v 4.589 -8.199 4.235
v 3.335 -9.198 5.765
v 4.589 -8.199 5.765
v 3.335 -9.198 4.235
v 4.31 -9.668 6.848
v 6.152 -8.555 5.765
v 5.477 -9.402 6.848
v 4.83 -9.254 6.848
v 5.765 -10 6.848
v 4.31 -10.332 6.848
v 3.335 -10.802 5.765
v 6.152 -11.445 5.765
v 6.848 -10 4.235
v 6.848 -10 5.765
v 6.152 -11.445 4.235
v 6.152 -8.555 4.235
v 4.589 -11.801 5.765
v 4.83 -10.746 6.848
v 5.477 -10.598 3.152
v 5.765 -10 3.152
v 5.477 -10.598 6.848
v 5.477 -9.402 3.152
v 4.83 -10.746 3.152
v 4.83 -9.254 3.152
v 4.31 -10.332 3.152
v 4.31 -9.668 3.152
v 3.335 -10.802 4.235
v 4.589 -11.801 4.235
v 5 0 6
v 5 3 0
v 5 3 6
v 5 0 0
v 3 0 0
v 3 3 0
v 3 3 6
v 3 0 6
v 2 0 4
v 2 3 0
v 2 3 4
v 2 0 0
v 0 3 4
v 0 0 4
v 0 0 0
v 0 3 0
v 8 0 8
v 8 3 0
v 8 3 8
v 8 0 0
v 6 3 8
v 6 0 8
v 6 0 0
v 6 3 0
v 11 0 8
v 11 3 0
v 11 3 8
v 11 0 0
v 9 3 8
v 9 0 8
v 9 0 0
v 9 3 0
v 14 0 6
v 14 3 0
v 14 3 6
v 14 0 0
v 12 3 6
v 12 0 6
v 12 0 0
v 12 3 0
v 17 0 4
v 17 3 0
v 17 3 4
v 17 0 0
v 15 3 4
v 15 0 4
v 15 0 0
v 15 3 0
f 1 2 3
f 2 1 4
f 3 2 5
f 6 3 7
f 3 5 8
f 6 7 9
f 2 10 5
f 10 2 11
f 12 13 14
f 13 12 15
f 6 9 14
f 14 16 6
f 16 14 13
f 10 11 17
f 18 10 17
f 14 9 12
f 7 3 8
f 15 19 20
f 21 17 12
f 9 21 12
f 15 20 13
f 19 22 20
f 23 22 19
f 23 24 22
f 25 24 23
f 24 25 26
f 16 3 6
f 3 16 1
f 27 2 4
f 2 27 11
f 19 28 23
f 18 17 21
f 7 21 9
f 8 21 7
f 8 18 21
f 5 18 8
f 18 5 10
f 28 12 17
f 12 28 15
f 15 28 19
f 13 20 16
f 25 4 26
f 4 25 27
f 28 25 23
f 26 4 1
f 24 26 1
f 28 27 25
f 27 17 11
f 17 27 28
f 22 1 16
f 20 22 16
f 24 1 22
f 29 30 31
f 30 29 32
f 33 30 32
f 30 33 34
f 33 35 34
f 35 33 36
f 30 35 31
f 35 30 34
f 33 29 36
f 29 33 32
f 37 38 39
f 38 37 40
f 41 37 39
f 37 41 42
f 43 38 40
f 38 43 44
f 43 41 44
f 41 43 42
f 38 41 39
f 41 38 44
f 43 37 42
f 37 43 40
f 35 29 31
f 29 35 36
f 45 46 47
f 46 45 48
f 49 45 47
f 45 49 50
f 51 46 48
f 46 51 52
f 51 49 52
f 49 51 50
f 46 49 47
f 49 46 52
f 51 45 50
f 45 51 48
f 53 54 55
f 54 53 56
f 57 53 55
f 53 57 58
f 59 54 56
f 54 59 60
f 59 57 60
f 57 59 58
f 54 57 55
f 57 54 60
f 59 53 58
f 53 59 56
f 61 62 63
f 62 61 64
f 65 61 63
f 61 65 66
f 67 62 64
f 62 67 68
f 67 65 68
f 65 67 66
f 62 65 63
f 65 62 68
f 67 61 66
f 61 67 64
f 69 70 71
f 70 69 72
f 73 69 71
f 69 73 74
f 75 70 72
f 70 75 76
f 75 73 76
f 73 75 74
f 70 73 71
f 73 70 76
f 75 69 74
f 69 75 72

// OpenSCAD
//cube(100,50,25);
//sphere(50);
translate([5,-10,5]){sphere(2);}


//cube([2,3,4]);
translate([3,0,0]) {
  cube([2,3,4]);
}

color([1,1,0]) cube([2,3,4]);
translate([3,0,0])
color([0,1,1]) cube([2,3,6]);
translate([6,0,0])
color([1,0,1]) cube([2,3,8]);
//
translate([9,0,0])
color([1,1,0]) cube([2,3,8]);
translate([12,0,0])
color([0,1,0]) cube([2,3,6]);
translate([15,0,0])
color([1,0,0]) cube([2,3,4]);
